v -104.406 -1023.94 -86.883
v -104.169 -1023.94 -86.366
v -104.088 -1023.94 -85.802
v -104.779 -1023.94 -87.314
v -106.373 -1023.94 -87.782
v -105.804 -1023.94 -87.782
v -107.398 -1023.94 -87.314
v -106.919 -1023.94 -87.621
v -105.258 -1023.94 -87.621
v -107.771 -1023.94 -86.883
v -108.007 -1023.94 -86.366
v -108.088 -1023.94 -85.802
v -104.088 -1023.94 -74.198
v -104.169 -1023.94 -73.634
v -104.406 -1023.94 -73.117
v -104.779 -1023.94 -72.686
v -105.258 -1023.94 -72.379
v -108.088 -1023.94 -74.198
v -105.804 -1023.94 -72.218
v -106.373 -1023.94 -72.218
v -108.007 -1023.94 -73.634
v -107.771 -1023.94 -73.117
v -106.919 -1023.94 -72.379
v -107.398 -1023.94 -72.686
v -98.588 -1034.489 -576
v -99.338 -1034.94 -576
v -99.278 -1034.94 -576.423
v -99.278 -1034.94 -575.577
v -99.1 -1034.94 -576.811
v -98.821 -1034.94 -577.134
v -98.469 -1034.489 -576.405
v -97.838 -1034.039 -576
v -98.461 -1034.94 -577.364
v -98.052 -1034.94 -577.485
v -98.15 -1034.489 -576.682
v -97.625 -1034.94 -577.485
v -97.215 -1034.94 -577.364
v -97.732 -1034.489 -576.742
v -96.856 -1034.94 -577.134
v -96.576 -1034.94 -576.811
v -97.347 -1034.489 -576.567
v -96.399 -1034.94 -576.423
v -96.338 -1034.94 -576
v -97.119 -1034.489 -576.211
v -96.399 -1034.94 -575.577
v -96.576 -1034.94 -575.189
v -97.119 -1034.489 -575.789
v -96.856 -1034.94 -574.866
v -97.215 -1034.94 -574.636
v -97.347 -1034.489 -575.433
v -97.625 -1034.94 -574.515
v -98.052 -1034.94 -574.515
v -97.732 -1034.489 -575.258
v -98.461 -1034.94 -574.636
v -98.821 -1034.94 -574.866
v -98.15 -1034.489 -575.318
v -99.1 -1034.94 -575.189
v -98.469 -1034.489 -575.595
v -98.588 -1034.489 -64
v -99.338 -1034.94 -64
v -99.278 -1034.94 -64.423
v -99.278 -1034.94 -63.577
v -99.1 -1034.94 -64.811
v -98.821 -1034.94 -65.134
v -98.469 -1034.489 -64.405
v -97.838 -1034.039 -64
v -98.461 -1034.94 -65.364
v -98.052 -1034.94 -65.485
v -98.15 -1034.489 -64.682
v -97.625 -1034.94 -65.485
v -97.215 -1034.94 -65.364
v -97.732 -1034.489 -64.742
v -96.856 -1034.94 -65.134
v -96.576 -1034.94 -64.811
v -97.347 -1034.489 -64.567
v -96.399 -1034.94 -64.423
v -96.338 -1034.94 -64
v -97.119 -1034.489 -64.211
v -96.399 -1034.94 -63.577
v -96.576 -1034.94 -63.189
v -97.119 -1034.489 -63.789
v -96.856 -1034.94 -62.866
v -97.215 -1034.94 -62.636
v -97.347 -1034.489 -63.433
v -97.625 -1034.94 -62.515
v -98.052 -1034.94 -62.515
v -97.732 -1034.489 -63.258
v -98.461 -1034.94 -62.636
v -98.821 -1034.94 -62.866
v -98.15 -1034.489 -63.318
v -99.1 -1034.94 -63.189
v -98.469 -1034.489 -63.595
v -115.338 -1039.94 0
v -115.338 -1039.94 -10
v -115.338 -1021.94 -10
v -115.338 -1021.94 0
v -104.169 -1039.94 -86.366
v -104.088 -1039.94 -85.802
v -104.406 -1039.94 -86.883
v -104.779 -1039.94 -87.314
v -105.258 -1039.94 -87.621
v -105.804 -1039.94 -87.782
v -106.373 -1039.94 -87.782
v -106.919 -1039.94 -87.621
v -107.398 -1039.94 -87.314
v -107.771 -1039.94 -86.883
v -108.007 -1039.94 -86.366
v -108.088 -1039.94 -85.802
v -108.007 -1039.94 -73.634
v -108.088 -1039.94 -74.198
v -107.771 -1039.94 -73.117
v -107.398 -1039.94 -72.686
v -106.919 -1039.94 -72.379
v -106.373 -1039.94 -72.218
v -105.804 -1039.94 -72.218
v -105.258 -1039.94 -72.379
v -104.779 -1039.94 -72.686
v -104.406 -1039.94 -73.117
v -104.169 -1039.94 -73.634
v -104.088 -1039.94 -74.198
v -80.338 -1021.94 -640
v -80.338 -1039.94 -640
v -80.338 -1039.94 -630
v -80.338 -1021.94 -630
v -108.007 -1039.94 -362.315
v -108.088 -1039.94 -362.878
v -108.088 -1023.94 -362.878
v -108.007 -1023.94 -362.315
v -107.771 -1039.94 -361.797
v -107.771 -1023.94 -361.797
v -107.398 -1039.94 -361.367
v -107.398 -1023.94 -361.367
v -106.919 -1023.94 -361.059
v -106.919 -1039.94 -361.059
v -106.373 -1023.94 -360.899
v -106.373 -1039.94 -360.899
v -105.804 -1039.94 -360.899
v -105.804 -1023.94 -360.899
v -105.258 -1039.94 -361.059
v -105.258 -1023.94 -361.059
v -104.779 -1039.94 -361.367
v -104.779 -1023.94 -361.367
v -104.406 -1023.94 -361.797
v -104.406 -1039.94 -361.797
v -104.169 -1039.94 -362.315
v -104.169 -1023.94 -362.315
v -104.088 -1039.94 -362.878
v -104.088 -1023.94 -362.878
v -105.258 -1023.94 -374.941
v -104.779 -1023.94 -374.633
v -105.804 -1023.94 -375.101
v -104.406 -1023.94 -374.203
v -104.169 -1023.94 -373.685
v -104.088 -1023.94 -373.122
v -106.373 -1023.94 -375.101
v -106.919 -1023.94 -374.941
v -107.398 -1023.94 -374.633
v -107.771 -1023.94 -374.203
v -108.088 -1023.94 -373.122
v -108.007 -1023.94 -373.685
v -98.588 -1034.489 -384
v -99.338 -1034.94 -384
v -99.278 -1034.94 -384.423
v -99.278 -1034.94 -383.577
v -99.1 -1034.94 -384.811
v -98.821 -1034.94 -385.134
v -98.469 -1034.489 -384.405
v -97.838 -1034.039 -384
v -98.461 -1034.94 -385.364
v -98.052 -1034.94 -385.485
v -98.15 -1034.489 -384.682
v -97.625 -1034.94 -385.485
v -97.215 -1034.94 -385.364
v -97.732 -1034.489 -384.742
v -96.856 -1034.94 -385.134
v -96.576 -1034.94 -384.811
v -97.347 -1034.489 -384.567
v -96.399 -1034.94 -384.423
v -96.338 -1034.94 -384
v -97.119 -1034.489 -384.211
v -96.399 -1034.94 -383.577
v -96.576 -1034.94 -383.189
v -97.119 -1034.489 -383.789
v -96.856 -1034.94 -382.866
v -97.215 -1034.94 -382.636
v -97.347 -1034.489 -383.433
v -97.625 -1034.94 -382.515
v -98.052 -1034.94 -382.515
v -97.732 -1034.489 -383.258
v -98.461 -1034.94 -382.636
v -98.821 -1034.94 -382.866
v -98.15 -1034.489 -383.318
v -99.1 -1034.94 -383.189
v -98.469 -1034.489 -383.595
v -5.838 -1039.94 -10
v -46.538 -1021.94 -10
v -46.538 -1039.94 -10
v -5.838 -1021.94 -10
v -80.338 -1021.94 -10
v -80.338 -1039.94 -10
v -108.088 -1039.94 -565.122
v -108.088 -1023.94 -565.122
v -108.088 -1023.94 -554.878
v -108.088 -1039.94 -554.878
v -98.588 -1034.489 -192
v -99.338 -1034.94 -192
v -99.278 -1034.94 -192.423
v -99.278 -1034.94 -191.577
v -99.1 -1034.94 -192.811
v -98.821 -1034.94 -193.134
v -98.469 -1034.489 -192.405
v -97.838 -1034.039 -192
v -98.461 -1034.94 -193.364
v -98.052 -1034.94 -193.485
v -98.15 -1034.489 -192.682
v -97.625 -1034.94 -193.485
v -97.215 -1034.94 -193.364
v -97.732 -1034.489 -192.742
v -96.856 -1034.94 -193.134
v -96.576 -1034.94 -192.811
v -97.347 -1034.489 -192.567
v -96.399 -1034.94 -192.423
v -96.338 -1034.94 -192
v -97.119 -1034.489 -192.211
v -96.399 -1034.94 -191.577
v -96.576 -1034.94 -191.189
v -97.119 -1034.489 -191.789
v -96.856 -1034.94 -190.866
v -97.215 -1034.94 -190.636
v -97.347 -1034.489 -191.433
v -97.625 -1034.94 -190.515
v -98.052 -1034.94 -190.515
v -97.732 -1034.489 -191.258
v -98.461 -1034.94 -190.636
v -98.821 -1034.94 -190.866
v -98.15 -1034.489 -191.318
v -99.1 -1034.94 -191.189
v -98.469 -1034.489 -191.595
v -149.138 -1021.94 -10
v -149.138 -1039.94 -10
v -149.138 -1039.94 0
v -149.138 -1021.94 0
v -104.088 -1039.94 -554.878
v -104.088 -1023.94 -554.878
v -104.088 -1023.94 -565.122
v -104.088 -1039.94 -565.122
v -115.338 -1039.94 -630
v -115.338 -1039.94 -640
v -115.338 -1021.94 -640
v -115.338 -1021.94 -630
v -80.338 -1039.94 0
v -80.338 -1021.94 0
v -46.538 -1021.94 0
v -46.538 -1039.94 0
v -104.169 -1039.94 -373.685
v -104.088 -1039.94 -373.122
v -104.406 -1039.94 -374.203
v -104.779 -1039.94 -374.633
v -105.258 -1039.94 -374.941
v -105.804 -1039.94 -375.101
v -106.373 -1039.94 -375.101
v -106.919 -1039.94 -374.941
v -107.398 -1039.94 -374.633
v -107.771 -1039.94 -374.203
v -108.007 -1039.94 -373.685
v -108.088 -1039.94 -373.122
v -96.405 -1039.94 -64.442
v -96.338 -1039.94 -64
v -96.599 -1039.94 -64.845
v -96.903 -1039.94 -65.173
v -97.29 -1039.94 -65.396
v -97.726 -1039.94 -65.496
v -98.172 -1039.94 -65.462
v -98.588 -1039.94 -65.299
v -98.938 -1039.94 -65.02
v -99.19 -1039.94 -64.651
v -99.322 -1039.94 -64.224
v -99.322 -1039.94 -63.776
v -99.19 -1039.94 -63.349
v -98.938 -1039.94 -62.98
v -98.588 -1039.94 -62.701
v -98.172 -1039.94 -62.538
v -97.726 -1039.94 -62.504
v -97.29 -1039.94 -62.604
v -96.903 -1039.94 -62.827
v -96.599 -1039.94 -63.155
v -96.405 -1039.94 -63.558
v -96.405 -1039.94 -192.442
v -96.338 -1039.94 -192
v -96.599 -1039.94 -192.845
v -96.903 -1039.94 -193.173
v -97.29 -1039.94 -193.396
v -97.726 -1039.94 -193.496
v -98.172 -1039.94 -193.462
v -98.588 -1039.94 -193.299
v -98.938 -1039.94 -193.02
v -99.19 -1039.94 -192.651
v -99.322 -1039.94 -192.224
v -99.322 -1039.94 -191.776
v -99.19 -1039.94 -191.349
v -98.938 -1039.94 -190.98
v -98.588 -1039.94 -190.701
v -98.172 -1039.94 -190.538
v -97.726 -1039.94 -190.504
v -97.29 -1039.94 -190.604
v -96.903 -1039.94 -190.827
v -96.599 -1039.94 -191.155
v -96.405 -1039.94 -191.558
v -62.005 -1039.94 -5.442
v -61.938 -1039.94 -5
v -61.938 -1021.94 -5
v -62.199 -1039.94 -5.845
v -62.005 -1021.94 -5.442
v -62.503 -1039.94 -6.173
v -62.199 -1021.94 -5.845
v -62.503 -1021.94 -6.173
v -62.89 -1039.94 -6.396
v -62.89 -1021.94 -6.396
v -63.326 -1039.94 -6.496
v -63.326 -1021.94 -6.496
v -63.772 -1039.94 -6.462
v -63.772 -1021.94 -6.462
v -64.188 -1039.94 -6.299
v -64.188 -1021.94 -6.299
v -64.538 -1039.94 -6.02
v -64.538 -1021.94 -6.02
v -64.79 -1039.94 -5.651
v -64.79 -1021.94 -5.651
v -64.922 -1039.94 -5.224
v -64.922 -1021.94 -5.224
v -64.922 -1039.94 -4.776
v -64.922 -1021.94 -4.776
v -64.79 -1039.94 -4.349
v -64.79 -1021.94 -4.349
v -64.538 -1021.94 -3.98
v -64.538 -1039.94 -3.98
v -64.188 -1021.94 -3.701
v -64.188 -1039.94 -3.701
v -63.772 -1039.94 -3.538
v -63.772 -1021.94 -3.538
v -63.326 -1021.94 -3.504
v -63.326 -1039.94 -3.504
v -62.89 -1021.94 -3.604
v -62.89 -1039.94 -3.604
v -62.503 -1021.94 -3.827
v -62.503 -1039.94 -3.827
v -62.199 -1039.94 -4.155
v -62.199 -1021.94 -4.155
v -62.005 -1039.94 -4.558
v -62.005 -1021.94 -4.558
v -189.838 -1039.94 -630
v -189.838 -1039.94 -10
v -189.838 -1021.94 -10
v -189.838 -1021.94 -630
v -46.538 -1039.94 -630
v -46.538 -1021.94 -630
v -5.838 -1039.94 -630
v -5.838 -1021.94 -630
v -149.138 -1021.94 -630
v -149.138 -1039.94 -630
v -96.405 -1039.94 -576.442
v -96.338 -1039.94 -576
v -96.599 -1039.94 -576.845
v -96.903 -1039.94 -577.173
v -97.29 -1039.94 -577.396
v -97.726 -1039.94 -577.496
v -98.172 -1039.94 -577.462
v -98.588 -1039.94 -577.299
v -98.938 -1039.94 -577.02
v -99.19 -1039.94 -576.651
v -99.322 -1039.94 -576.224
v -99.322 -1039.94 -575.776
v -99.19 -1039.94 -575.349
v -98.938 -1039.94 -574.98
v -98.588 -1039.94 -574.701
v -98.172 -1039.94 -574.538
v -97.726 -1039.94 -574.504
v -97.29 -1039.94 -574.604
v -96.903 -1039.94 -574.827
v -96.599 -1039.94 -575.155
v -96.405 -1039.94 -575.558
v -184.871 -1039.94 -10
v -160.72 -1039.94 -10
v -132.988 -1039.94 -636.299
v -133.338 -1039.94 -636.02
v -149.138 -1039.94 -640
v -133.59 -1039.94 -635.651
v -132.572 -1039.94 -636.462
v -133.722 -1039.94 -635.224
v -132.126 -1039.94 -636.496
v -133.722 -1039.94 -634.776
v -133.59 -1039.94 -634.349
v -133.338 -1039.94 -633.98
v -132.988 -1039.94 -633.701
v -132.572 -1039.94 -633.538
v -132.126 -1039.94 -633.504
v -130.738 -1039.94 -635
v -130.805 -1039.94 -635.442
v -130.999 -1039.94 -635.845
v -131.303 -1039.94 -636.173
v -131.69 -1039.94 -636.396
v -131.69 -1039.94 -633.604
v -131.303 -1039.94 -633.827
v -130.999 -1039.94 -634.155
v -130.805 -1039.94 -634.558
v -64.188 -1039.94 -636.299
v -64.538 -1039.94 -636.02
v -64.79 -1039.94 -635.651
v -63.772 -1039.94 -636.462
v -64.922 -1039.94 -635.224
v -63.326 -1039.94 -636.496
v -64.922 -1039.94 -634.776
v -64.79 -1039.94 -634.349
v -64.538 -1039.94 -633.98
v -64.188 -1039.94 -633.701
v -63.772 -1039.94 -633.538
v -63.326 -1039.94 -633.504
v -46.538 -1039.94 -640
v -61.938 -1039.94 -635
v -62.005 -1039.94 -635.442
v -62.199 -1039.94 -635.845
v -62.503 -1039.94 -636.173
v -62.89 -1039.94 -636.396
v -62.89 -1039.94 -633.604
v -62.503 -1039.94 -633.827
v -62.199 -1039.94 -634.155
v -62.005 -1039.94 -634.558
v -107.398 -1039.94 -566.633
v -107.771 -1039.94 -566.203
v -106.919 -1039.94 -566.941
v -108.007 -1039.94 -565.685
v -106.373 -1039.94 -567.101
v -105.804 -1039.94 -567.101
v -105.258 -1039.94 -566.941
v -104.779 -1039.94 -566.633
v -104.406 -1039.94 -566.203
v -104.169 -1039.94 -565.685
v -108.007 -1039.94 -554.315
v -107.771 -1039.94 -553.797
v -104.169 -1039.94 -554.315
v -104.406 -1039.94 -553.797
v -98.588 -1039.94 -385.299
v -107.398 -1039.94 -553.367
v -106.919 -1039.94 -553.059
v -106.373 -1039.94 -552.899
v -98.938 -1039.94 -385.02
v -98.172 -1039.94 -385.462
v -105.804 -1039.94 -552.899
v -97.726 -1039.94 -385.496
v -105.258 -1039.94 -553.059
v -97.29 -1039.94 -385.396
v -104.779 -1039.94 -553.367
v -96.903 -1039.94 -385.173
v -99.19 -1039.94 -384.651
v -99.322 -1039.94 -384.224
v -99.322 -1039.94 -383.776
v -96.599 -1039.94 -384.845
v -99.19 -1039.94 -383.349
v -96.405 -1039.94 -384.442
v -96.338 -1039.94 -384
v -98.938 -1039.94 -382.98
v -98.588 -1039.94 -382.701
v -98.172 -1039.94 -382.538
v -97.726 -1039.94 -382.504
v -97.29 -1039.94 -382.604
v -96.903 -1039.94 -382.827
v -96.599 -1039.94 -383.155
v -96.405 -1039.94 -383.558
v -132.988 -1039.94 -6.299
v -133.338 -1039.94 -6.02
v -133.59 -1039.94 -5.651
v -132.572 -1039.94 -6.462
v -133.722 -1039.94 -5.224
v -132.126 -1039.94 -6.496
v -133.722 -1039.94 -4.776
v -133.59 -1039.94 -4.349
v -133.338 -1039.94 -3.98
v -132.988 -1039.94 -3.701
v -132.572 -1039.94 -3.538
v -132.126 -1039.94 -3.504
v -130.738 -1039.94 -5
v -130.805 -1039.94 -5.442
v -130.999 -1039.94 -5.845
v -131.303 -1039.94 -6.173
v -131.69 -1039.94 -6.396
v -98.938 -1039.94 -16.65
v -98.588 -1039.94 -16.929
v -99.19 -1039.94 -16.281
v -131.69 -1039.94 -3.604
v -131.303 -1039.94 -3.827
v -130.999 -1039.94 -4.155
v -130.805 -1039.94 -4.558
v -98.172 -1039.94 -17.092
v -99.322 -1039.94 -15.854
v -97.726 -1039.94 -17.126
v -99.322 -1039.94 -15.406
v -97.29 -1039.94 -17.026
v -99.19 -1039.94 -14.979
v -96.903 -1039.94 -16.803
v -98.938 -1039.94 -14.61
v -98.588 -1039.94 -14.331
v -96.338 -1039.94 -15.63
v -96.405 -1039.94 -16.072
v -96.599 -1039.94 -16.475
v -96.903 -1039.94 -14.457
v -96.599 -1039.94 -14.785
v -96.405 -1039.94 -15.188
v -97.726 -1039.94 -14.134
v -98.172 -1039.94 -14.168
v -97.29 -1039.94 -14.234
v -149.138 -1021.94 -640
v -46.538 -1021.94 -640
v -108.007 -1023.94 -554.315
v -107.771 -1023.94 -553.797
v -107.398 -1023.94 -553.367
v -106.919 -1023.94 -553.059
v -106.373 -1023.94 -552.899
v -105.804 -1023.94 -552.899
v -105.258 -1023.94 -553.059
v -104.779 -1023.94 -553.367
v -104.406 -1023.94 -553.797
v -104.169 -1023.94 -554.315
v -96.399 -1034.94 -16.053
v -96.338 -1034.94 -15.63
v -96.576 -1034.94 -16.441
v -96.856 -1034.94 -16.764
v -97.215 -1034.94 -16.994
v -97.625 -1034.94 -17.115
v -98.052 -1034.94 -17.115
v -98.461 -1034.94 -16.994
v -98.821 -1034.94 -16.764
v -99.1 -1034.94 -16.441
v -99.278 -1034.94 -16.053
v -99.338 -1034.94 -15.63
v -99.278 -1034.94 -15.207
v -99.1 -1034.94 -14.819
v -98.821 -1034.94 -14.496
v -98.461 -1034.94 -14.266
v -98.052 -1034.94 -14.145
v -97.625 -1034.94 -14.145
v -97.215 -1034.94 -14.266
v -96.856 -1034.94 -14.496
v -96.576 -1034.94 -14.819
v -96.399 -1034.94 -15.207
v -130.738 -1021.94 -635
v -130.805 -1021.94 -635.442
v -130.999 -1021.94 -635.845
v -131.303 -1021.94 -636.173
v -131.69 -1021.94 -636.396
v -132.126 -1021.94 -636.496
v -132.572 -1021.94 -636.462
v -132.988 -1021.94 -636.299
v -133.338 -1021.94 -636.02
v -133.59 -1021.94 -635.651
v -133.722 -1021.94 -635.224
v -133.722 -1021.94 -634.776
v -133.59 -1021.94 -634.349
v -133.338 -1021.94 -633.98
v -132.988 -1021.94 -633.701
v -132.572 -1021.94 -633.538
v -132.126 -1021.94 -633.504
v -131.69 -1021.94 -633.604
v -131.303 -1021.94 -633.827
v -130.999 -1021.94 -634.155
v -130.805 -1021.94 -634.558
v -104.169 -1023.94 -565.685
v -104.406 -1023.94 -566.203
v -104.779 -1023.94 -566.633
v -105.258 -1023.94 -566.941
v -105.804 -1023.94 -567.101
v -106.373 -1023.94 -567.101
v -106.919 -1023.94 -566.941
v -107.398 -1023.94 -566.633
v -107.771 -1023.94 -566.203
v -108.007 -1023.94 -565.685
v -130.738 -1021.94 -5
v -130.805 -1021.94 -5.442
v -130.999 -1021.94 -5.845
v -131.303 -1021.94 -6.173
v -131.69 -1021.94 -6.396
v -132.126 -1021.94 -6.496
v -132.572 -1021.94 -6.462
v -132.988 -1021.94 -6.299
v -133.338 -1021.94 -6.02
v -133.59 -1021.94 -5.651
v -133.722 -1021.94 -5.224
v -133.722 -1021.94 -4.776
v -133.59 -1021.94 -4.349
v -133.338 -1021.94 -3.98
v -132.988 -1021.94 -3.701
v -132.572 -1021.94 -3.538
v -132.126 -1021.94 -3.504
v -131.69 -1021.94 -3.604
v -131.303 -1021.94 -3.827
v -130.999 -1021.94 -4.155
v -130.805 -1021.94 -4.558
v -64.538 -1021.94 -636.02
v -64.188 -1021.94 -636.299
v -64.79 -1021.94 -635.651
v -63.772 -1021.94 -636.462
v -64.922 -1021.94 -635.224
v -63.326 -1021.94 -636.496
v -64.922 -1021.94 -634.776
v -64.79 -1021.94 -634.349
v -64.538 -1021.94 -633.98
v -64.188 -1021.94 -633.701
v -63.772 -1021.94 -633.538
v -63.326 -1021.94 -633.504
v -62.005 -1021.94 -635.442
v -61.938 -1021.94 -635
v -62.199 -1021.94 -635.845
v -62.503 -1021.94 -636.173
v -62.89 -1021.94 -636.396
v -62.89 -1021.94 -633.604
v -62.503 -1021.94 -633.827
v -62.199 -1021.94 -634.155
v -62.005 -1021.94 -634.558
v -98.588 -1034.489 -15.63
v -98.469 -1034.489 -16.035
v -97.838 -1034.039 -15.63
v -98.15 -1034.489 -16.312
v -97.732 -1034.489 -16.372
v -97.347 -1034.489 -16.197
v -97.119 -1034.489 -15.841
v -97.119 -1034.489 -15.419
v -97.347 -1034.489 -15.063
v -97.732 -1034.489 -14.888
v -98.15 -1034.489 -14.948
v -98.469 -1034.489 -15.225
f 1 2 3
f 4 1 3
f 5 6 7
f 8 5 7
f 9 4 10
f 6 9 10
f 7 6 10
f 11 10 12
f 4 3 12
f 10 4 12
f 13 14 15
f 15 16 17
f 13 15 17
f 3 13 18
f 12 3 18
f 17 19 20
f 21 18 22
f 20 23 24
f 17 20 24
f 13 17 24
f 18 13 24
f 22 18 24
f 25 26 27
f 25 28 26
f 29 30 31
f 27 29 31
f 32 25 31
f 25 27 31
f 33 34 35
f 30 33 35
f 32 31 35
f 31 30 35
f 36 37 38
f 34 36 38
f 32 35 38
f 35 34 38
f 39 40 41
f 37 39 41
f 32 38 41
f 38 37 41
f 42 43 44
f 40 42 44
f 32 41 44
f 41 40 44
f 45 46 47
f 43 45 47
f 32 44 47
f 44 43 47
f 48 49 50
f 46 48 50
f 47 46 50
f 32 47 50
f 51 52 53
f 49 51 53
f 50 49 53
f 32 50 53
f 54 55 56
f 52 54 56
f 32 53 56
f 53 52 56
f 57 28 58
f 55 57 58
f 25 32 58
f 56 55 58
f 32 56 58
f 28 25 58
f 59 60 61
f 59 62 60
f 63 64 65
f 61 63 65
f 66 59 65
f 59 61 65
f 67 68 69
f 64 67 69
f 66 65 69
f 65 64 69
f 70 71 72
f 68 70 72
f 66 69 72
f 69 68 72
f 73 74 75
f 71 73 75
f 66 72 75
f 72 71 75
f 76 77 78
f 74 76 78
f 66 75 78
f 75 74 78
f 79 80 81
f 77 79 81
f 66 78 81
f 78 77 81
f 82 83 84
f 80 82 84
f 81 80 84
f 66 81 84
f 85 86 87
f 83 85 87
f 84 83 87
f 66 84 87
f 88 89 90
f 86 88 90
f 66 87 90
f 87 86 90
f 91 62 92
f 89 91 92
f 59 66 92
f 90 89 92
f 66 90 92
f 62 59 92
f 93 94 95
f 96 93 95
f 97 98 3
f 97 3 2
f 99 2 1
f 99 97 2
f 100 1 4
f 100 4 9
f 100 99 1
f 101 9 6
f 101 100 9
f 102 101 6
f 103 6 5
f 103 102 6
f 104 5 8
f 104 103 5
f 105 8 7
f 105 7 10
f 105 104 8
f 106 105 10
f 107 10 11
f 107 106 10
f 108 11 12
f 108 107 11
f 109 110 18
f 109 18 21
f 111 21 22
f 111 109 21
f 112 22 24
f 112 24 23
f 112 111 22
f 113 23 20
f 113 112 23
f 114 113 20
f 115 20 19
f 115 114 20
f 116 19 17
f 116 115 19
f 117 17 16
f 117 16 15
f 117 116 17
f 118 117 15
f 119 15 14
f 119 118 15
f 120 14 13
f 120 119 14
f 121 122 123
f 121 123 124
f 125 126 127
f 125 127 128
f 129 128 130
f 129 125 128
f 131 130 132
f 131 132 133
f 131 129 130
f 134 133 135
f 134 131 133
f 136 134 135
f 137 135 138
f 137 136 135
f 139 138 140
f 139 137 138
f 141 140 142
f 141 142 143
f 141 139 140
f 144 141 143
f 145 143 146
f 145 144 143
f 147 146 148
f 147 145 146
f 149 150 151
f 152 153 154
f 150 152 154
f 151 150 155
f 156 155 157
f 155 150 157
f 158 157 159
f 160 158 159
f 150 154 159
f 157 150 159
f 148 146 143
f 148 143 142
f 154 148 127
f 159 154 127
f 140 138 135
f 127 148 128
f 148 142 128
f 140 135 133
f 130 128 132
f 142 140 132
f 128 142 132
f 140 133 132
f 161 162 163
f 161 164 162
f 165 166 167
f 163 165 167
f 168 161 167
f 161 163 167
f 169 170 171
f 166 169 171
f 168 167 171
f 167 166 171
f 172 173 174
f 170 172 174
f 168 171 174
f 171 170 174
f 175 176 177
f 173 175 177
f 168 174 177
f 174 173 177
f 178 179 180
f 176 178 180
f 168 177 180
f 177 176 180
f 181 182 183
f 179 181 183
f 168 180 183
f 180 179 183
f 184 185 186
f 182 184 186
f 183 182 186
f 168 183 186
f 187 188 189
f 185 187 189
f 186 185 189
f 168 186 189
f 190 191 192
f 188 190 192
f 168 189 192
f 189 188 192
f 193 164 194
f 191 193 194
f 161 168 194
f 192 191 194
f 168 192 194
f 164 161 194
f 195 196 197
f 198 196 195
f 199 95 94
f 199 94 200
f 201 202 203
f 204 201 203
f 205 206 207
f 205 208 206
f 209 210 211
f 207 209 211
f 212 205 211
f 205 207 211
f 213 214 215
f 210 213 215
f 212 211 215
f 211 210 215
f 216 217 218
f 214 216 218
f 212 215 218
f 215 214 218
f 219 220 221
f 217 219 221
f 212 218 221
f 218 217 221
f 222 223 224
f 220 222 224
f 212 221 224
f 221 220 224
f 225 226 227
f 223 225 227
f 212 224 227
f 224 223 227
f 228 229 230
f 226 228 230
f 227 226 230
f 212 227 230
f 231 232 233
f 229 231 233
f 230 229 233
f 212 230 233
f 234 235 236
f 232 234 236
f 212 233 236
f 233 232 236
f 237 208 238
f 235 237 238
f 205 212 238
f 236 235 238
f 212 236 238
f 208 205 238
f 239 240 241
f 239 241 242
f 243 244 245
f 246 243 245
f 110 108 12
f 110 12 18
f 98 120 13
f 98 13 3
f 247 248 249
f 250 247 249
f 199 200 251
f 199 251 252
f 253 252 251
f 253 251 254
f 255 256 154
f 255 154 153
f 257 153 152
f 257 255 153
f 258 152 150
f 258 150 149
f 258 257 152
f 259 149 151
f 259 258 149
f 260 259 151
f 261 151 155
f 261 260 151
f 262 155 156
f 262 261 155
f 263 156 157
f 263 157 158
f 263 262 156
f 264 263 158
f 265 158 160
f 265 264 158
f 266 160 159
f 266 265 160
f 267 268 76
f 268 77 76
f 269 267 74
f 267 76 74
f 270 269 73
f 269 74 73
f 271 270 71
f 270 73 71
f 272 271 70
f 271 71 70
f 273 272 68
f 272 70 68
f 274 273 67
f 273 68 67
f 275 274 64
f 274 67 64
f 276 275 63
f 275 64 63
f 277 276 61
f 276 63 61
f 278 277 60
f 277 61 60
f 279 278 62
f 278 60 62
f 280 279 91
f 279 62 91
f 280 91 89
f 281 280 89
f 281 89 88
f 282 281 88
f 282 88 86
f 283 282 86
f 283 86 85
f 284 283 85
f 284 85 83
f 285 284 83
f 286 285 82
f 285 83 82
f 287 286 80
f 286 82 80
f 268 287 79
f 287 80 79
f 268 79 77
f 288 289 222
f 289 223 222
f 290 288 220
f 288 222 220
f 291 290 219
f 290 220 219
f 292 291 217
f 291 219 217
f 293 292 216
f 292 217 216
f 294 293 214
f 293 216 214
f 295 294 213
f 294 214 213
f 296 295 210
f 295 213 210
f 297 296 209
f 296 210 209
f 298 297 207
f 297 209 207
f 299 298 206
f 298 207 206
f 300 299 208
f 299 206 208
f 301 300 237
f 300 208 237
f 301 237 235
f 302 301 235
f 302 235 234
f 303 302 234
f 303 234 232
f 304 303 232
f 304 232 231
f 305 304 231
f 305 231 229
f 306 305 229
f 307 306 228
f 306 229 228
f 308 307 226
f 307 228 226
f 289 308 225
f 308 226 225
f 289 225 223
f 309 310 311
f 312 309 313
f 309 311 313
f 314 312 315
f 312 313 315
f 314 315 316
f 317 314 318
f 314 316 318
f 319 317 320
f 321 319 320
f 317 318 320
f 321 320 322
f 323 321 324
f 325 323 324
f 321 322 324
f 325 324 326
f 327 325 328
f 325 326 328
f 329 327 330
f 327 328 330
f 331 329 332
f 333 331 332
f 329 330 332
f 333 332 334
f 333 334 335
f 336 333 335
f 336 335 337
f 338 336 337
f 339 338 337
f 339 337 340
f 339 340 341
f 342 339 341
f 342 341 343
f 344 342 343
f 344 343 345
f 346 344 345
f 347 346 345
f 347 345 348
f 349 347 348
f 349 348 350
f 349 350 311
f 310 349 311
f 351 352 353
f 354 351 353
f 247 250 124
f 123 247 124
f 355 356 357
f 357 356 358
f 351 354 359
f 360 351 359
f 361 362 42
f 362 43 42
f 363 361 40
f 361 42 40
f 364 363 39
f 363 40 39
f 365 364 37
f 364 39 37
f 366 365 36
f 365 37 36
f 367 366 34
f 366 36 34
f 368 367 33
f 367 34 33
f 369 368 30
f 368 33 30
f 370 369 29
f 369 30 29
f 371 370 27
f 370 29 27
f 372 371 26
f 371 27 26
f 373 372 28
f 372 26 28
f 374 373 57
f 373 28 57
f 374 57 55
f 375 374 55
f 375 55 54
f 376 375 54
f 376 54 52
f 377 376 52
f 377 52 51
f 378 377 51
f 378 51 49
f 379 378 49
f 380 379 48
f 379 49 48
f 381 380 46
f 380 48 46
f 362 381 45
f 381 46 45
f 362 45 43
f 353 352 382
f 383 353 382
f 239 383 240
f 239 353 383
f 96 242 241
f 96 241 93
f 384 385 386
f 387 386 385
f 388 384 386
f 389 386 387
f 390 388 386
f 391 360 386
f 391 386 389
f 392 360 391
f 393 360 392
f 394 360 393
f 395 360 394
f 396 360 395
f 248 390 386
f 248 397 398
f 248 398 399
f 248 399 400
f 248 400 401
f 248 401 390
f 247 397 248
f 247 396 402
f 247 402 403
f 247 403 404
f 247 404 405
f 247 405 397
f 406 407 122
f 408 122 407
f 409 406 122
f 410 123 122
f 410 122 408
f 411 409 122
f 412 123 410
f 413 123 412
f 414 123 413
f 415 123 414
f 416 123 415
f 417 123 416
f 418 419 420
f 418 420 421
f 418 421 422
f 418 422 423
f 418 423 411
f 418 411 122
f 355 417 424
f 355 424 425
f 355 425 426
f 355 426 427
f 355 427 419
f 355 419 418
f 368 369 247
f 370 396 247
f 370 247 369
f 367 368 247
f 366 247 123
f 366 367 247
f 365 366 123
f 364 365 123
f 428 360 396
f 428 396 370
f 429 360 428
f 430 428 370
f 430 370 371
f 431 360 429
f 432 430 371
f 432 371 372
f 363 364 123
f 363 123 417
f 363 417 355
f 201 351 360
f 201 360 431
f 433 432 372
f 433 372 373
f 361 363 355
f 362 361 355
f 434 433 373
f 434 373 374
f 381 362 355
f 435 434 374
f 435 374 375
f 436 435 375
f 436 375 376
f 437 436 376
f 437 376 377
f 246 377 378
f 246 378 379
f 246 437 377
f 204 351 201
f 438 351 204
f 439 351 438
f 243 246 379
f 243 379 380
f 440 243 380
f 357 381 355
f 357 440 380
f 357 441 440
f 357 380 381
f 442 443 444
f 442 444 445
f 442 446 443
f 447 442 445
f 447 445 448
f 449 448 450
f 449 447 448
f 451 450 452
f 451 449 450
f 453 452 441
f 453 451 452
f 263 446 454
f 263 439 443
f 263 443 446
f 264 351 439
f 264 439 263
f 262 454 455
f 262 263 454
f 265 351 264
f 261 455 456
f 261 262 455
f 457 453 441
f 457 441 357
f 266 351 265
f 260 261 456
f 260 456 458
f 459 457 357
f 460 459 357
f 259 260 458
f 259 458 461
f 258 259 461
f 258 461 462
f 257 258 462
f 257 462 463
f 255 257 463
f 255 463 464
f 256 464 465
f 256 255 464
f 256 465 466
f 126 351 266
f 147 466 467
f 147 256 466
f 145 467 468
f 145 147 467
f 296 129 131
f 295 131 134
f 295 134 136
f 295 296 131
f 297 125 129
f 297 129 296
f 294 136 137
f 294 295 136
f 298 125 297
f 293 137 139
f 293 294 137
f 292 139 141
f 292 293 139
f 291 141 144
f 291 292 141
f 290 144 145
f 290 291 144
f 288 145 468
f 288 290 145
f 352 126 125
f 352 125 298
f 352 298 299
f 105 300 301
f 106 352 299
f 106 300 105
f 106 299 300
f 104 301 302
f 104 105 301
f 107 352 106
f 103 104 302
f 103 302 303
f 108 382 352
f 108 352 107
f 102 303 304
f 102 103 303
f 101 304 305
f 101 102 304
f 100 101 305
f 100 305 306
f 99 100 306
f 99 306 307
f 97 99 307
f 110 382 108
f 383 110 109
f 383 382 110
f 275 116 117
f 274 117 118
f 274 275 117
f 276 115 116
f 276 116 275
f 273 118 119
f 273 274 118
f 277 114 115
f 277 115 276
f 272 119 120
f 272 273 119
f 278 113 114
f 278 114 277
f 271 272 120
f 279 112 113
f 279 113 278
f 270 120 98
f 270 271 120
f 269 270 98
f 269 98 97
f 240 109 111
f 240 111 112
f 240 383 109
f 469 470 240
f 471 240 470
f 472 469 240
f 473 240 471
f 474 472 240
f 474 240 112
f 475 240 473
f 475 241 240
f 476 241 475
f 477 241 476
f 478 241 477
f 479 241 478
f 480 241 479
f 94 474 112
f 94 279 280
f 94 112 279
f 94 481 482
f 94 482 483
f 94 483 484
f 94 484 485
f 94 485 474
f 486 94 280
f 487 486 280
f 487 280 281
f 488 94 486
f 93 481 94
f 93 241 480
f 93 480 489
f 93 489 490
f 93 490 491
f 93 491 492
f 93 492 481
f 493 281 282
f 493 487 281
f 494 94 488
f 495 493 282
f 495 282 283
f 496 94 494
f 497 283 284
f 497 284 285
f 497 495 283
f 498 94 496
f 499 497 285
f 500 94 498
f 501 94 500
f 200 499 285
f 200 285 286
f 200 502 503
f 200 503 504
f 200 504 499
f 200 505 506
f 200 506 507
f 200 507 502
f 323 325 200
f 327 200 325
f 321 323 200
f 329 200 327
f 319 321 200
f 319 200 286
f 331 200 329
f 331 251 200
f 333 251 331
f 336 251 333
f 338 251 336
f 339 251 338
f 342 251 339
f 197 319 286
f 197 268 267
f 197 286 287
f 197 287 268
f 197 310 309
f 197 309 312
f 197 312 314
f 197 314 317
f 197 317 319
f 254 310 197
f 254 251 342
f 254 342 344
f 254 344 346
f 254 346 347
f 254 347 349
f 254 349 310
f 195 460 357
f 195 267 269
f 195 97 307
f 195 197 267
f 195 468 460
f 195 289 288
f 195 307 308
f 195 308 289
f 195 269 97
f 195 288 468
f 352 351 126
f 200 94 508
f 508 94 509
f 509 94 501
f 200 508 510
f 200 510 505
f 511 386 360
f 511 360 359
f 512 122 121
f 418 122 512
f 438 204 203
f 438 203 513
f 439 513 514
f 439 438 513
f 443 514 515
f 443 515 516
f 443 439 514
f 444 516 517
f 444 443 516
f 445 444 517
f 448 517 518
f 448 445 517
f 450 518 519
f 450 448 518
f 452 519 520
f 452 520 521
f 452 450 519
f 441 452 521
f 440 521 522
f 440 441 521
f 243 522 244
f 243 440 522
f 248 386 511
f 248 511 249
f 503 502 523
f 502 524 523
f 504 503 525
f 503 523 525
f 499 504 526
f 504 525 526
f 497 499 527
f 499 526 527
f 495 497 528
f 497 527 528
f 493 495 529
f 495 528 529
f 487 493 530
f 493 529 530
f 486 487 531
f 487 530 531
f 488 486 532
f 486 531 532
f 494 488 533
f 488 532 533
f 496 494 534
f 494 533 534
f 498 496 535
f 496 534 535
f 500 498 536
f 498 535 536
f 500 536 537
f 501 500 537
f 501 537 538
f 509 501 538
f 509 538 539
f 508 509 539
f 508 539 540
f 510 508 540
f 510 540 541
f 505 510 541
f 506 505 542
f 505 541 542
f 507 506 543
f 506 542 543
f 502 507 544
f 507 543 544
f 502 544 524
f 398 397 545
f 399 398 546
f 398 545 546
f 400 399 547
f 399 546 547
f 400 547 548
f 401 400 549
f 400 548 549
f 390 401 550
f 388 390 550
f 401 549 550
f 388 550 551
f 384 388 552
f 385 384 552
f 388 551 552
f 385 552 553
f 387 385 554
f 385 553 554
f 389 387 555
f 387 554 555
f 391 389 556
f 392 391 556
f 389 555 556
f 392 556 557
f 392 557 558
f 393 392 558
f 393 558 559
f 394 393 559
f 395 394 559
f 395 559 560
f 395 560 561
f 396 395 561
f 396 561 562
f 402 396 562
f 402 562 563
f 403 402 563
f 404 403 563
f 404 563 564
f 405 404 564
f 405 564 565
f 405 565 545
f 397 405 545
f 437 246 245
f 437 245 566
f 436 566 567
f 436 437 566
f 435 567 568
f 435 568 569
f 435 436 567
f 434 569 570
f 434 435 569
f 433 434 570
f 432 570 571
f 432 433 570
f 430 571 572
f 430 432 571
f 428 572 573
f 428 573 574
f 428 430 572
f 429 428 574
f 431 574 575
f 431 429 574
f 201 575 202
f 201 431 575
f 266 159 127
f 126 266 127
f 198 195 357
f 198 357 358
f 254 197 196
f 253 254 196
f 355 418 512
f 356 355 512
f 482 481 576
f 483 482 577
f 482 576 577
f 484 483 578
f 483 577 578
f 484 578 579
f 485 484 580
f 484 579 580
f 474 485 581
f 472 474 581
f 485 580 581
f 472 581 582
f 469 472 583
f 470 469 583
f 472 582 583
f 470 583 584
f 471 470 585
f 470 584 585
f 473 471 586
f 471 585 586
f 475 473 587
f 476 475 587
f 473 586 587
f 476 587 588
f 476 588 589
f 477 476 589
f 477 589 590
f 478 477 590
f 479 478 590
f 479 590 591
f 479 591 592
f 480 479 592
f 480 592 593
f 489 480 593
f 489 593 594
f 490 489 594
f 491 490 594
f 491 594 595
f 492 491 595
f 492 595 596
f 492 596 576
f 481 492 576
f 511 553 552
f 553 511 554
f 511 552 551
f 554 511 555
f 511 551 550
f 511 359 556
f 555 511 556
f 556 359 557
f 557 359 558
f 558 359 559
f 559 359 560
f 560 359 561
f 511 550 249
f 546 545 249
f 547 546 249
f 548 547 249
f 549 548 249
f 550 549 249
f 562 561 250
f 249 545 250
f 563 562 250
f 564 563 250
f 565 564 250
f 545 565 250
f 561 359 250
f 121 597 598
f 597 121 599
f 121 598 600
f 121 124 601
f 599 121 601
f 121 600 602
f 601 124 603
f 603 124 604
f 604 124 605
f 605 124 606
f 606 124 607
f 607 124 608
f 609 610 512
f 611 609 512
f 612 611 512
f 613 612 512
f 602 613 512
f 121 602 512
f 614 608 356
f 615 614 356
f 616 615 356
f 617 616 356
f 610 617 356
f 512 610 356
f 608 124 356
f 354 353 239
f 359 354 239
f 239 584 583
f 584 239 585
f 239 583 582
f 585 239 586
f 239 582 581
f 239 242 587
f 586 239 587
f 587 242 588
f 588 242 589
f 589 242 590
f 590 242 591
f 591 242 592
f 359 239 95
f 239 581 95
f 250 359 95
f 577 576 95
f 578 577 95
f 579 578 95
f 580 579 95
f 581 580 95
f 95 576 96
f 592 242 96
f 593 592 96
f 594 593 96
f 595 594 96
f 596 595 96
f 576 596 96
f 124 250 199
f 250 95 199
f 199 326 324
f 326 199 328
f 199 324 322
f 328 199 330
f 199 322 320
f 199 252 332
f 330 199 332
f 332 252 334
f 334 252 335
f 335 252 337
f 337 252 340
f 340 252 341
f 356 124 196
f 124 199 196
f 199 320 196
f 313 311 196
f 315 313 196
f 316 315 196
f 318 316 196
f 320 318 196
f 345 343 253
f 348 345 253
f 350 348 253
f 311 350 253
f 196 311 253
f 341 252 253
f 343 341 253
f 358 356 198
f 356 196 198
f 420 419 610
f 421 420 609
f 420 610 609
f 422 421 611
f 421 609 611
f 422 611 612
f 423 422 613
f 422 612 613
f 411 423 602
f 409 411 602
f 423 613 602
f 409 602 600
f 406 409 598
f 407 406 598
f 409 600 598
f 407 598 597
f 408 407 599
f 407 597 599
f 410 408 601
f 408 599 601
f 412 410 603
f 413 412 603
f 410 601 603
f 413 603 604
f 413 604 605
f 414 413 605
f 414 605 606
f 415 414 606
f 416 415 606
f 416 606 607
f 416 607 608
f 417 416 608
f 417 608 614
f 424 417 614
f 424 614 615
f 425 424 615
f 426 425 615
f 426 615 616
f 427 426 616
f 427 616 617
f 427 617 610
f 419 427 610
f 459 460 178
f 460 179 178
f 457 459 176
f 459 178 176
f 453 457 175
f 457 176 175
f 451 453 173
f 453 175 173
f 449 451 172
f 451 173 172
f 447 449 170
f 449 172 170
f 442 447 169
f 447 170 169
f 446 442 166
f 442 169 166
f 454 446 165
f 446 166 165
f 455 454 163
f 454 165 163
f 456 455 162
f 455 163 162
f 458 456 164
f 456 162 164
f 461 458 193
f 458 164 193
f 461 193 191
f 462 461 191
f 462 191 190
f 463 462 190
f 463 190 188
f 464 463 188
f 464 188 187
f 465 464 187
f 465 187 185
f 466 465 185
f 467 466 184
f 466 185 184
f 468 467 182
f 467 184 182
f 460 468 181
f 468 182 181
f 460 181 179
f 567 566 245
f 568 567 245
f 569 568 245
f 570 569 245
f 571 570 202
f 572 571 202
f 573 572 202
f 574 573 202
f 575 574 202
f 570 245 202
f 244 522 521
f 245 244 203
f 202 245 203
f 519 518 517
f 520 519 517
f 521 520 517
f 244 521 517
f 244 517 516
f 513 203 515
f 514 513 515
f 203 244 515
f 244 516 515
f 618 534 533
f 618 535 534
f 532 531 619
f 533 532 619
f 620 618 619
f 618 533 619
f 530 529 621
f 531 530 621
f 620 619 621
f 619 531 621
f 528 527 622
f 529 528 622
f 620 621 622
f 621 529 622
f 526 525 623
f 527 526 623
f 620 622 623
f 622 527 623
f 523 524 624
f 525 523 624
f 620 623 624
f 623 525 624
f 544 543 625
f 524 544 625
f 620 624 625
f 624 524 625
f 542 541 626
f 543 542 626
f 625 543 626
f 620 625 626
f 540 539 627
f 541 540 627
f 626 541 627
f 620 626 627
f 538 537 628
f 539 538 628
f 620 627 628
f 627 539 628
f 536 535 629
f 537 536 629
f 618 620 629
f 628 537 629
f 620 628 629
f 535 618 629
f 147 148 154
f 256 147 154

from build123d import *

# Parameters (mm, degrees)
SKETCH1_W                    = 184
SKETCH1_H                    = 18
BOSS_EXTRUDE1_DEPTH          = 658
CAVITY1_START                = -10
CAVITY1_OUTLINE_W            = 35
CAVITY1_OUTLINE_H            = 18
CAVITY1_OUTLINE_R            = 1.5
CAVITY1_OUTLINE_W_2          = 40.7
CAVITY1_DEPTH                = 10
CAVITY2_START                = -640
CAVITY2_OUTLINE_W            = 35
CAVITY2_OUTLINE_H            = 18
CAVITY2_OUTLINE_R            = 1.5
CAVITY2_OUTLINE_W_2          = 40.7
CAVITY2_DEPTH                = 10
SKETCH2_W                    = 184
SKETCH2_H                    = 18
CUT_EXTRUDE1_DEPTH           = 20
F_3_0_3_DIAMETER_HOLE1_D     = 3
F_3_0_3_DIAMETER_HOLE1_DEPTH = 25
F_3_0_3_DIAMETER_HOLE1_TIP   = 0.901290929
SKETCH5_W                    = 15.438081993
SKETCH5_H                    = 17.38610898
SKETCH5_W_2                  = 12.462066187
SKETCH5_W_3                  = 22.69212052
SKETCH5_W_4                  = 24.151046806
SKETCH5_H_2                  = 18.747641983
SKETCH5_W_5                  = 17.028403492
SKETCH5_H_3                  = 21.404849388
SKETCH5_W_6                  = 27.020251182
CUT_EXTRUDE2_DEPTH           = 20
F_3_0_3_DIAMETER_HOLE2_D     = 3
F_3_0_3_DIAMETER_HOLE2_DEPTH = 5
F_3_0_3_DIAMETER_HOLE2_TIP   = 0.901290929
CUT_EXTRUDE3_DEPTH           = 16


# Read off the part's stored shape, not the designer's step: Cavity1, Cavity2
with BuildPart() as part:
    # Sketch1 → Boss-Extrude1 (new body)
    with BuildSketch(Plane.XY):
        with Locations((-97.838367622, -1030.94)):
            Rectangle(SKETCH1_W, SKETCH1_H)
    extrude(amount=-BOSS_EXTRUDE1_DEPTH)

    # Cavity1 outline → Cavity1 (cut)
    # profile 1 of 3: a face of its own
    with BuildSketch(Plane.XY.offset(CAVITY1_START)):
        with Locations((-97.838367622, -1030.94)):
            Rectangle(CAVITY1_OUTLINE_W, CAVITY1_OUTLINE_H)
        with Locations((-97.838367622, -1030.94)):
            Circle(CAVITY1_OUTLINE_R, mode=Mode.SUBTRACT)
    # profile 2 of 3: a face of its own
    with BuildSketch(Plane.XY.offset(CAVITY1_START)):
        with Locations((-169.488367622, -1030.94)):
            Rectangle(CAVITY1_OUTLINE_W_2, CAVITY1_OUTLINE_H)
        with Locations((-169.488367622, -1030.94)):
            Circle(CAVITY1_OUTLINE_R, mode=Mode.SUBTRACT)
    # profile 3 of 3: a face of its own
    with BuildSketch(Plane.XY.offset(CAVITY1_START)):
        with Locations((-26.188367622, -1030.94)):
            Rectangle(CAVITY1_OUTLINE_W_2, CAVITY1_OUTLINE_H)
        with Locations((-26.188367622, -1030.94)):
            Circle(CAVITY1_OUTLINE_R, mode=Mode.SUBTRACT)
    extrude(amount=CAVITY1_DEPTH, mode=Mode.SUBTRACT)

    # Cavity2 outline → Cavity2 (cut)
    # profile 1 of 3: a face of its own
    with BuildSketch(Plane.XY.offset(CAVITY2_START)):
        with Locations((-97.838367622, -1030.94)):
            Rectangle(CAVITY2_OUTLINE_W, CAVITY2_OUTLINE_H)
        with Locations((-97.838367622, -1030.94)):
            Circle(CAVITY2_OUTLINE_R, mode=Mode.SUBTRACT)
    # profile 2 of 3: a face of its own
    with BuildSketch(Plane.XY.offset(CAVITY2_START)):
        with Locations((-169.488367622, -1030.94)):
            Rectangle(CAVITY2_OUTLINE_W_2, CAVITY2_OUTLINE_H)
        with Locations((-169.488367622, -1030.94)):
            Circle(CAVITY2_OUTLINE_R, mode=Mode.SUBTRACT)
    # profile 3 of 3: a face of its own
    with BuildSketch(Plane.XY.offset(CAVITY2_START)):
        with Locations((-26.188367622, -1030.94)):
            Rectangle(CAVITY2_OUTLINE_W_2, CAVITY2_OUTLINE_H)
        with Locations((-26.188367622, -1030.94)):
            Circle(CAVITY2_OUTLINE_R, mode=Mode.SUBTRACT)
    extrude(amount=CAVITY2_DEPTH, mode=Mode.SUBTRACT)

    # Sketch2 → Cut-Extrude1 (cut)
    with BuildSketch(Plane.XZ.offset(1039.94)):
        with Locations((-97.838367622, -649)):
            Rectangle(SKETCH2_W, SKETCH2_H)
    extrude(amount=-CUT_EXTRUDE1_DEPTH, mode=Mode.SUBTRACT)

    # Ø3.0 (3) Diameter Hole1
    with Locations(Plane(origin=(0, -1039.94, 0), x_dir=(-1, 0, 0), z_dir=(0, -1, 0))):
        with Locations((132.238367622, 5), (63.438367622, 5), (63.438367622, 635), (132.238367622, 635)):
            Hole(F_3_0_3_DIAMETER_HOLE1_D / 2, depth=F_3_0_3_DIAMETER_HOLE1_DEPTH)
            with Locations((0, 0, -(F_3_0_3_DIAMETER_HOLE1_DEPTH + F_3_0_3_DIAMETER_HOLE1_TIP / 2))):  # 118° drill point
                Cone(0, F_3_0_3_DIAMETER_HOLE1_D / 2, F_3_0_3_DIAMETER_HOLE1_TIP, mode=Mode.SUBTRACT)

    # Sketch5 → Cut-Extrude2 (cut)
    with BuildSketch(Plane.XZ.offset(1039.94)):
        with Locations((-168.439296688, -638.69305449)):
            Rectangle(SKETCH5_W, SKETCH5_H)
        with Locations((-97.014917346, -638.69305449)):
            Rectangle(SKETCH5_W_2, SKETCH5_H)
        with Locations((-26.055540475, -638.69305449)):
            Rectangle(SKETCH5_W_3, SKETCH5_H)
        with Locations((-172.795779094, -0.626179008)):
            Rectangle(SKETCH5_W_4, SKETCH5_H_2)
        with Locations((-99.298085999, 0.702424694)):
            Rectangle(SKETCH5_W_5, SKETCH5_H_3)
        with Locations((-23.891475144, 0.702424694)):
            Rectangle(SKETCH5_W_6, SKETCH5_H_3)
    extrude(amount=-CUT_EXTRUDE2_DEPTH, mode=Mode.SUBTRACT)

    # Ø3.0 (3) Diameter Hole2
    with Locations(Plane(origin=(0, -1039.94, 0), x_dir=(-1, 0, 0), z_dir=(0, -1, 0))):
        with Locations((97.838367622, 64), (97.838367622, 384), (97.838367622, 576), (97.838367622, 192), (97.838367622, 15.63)):
            Hole(F_3_0_3_DIAMETER_HOLE2_D / 2, depth=F_3_0_3_DIAMETER_HOLE2_DEPTH)
            with Locations((0, 0, -(F_3_0_3_DIAMETER_HOLE2_DEPTH + F_3_0_3_DIAMETER_HOLE2_TIP / 2))):  # 118° drill point
                Cone(0, F_3_0_3_DIAMETER_HOLE2_D / 2, F_3_0_3_DIAMETER_HOLE2_TIP, mode=Mode.SUBTRACT)

    # Sketch8 → Cut-Extrude3 (cut)
    with BuildSketch(Plane.XZ.offset(1039.94)):
        with BuildLine():
            Line((-108.088367622, -85.802173793), (-108.088367622, -74.197826207))
            ThreePointArc((-108.088367622, -74.197826207), (-106.088367622, -72.197826207), (-104.088367622, -74.197826207))
            Line((-104.088367622, -74.197826207), (-104.088367622, -85.802173793))
            ThreePointArc((-104.088367622, -85.802173793), (-106.088367622, -87.802173793), (-108.088367622, -85.802173793))
        make_face()
        with BuildLine():
            Line((-108.088367622, -373.121722836), (-108.088367622, -362.878277164))
            ThreePointArc((-108.088367622, -362.878277164), (-106.088367622, -360.878277164), (-104.088367622, -362.878277164))
            Line((-104.088367622, -362.878277164), (-104.088367622, -373.121722836))
            ThreePointArc((-104.088367622, -373.121722836), (-106.088367622, -375.121722836), (-108.088367622, -373.121722836))
        make_face()
        with BuildLine():
            Line((-108.088367622, -565.121722836), (-108.088367622, -554.878277164))
            ThreePointArc((-108.088367622, -554.878277164), (-106.088367622, -552.878277164), (-104.088367622, -554.878277164))
            Line((-104.088367622, -554.878277164), (-104.088367622, -565.121722836))
            ThreePointArc((-104.088367622, -565.121722836), (-106.088367622, -567.121722836), (-108.088367622, -565.121722836))
        make_face()
    extrude(amount=-CUT_EXTRUDE3_DEPTH, mode=Mode.SUBTRACT)


solid = part.part
